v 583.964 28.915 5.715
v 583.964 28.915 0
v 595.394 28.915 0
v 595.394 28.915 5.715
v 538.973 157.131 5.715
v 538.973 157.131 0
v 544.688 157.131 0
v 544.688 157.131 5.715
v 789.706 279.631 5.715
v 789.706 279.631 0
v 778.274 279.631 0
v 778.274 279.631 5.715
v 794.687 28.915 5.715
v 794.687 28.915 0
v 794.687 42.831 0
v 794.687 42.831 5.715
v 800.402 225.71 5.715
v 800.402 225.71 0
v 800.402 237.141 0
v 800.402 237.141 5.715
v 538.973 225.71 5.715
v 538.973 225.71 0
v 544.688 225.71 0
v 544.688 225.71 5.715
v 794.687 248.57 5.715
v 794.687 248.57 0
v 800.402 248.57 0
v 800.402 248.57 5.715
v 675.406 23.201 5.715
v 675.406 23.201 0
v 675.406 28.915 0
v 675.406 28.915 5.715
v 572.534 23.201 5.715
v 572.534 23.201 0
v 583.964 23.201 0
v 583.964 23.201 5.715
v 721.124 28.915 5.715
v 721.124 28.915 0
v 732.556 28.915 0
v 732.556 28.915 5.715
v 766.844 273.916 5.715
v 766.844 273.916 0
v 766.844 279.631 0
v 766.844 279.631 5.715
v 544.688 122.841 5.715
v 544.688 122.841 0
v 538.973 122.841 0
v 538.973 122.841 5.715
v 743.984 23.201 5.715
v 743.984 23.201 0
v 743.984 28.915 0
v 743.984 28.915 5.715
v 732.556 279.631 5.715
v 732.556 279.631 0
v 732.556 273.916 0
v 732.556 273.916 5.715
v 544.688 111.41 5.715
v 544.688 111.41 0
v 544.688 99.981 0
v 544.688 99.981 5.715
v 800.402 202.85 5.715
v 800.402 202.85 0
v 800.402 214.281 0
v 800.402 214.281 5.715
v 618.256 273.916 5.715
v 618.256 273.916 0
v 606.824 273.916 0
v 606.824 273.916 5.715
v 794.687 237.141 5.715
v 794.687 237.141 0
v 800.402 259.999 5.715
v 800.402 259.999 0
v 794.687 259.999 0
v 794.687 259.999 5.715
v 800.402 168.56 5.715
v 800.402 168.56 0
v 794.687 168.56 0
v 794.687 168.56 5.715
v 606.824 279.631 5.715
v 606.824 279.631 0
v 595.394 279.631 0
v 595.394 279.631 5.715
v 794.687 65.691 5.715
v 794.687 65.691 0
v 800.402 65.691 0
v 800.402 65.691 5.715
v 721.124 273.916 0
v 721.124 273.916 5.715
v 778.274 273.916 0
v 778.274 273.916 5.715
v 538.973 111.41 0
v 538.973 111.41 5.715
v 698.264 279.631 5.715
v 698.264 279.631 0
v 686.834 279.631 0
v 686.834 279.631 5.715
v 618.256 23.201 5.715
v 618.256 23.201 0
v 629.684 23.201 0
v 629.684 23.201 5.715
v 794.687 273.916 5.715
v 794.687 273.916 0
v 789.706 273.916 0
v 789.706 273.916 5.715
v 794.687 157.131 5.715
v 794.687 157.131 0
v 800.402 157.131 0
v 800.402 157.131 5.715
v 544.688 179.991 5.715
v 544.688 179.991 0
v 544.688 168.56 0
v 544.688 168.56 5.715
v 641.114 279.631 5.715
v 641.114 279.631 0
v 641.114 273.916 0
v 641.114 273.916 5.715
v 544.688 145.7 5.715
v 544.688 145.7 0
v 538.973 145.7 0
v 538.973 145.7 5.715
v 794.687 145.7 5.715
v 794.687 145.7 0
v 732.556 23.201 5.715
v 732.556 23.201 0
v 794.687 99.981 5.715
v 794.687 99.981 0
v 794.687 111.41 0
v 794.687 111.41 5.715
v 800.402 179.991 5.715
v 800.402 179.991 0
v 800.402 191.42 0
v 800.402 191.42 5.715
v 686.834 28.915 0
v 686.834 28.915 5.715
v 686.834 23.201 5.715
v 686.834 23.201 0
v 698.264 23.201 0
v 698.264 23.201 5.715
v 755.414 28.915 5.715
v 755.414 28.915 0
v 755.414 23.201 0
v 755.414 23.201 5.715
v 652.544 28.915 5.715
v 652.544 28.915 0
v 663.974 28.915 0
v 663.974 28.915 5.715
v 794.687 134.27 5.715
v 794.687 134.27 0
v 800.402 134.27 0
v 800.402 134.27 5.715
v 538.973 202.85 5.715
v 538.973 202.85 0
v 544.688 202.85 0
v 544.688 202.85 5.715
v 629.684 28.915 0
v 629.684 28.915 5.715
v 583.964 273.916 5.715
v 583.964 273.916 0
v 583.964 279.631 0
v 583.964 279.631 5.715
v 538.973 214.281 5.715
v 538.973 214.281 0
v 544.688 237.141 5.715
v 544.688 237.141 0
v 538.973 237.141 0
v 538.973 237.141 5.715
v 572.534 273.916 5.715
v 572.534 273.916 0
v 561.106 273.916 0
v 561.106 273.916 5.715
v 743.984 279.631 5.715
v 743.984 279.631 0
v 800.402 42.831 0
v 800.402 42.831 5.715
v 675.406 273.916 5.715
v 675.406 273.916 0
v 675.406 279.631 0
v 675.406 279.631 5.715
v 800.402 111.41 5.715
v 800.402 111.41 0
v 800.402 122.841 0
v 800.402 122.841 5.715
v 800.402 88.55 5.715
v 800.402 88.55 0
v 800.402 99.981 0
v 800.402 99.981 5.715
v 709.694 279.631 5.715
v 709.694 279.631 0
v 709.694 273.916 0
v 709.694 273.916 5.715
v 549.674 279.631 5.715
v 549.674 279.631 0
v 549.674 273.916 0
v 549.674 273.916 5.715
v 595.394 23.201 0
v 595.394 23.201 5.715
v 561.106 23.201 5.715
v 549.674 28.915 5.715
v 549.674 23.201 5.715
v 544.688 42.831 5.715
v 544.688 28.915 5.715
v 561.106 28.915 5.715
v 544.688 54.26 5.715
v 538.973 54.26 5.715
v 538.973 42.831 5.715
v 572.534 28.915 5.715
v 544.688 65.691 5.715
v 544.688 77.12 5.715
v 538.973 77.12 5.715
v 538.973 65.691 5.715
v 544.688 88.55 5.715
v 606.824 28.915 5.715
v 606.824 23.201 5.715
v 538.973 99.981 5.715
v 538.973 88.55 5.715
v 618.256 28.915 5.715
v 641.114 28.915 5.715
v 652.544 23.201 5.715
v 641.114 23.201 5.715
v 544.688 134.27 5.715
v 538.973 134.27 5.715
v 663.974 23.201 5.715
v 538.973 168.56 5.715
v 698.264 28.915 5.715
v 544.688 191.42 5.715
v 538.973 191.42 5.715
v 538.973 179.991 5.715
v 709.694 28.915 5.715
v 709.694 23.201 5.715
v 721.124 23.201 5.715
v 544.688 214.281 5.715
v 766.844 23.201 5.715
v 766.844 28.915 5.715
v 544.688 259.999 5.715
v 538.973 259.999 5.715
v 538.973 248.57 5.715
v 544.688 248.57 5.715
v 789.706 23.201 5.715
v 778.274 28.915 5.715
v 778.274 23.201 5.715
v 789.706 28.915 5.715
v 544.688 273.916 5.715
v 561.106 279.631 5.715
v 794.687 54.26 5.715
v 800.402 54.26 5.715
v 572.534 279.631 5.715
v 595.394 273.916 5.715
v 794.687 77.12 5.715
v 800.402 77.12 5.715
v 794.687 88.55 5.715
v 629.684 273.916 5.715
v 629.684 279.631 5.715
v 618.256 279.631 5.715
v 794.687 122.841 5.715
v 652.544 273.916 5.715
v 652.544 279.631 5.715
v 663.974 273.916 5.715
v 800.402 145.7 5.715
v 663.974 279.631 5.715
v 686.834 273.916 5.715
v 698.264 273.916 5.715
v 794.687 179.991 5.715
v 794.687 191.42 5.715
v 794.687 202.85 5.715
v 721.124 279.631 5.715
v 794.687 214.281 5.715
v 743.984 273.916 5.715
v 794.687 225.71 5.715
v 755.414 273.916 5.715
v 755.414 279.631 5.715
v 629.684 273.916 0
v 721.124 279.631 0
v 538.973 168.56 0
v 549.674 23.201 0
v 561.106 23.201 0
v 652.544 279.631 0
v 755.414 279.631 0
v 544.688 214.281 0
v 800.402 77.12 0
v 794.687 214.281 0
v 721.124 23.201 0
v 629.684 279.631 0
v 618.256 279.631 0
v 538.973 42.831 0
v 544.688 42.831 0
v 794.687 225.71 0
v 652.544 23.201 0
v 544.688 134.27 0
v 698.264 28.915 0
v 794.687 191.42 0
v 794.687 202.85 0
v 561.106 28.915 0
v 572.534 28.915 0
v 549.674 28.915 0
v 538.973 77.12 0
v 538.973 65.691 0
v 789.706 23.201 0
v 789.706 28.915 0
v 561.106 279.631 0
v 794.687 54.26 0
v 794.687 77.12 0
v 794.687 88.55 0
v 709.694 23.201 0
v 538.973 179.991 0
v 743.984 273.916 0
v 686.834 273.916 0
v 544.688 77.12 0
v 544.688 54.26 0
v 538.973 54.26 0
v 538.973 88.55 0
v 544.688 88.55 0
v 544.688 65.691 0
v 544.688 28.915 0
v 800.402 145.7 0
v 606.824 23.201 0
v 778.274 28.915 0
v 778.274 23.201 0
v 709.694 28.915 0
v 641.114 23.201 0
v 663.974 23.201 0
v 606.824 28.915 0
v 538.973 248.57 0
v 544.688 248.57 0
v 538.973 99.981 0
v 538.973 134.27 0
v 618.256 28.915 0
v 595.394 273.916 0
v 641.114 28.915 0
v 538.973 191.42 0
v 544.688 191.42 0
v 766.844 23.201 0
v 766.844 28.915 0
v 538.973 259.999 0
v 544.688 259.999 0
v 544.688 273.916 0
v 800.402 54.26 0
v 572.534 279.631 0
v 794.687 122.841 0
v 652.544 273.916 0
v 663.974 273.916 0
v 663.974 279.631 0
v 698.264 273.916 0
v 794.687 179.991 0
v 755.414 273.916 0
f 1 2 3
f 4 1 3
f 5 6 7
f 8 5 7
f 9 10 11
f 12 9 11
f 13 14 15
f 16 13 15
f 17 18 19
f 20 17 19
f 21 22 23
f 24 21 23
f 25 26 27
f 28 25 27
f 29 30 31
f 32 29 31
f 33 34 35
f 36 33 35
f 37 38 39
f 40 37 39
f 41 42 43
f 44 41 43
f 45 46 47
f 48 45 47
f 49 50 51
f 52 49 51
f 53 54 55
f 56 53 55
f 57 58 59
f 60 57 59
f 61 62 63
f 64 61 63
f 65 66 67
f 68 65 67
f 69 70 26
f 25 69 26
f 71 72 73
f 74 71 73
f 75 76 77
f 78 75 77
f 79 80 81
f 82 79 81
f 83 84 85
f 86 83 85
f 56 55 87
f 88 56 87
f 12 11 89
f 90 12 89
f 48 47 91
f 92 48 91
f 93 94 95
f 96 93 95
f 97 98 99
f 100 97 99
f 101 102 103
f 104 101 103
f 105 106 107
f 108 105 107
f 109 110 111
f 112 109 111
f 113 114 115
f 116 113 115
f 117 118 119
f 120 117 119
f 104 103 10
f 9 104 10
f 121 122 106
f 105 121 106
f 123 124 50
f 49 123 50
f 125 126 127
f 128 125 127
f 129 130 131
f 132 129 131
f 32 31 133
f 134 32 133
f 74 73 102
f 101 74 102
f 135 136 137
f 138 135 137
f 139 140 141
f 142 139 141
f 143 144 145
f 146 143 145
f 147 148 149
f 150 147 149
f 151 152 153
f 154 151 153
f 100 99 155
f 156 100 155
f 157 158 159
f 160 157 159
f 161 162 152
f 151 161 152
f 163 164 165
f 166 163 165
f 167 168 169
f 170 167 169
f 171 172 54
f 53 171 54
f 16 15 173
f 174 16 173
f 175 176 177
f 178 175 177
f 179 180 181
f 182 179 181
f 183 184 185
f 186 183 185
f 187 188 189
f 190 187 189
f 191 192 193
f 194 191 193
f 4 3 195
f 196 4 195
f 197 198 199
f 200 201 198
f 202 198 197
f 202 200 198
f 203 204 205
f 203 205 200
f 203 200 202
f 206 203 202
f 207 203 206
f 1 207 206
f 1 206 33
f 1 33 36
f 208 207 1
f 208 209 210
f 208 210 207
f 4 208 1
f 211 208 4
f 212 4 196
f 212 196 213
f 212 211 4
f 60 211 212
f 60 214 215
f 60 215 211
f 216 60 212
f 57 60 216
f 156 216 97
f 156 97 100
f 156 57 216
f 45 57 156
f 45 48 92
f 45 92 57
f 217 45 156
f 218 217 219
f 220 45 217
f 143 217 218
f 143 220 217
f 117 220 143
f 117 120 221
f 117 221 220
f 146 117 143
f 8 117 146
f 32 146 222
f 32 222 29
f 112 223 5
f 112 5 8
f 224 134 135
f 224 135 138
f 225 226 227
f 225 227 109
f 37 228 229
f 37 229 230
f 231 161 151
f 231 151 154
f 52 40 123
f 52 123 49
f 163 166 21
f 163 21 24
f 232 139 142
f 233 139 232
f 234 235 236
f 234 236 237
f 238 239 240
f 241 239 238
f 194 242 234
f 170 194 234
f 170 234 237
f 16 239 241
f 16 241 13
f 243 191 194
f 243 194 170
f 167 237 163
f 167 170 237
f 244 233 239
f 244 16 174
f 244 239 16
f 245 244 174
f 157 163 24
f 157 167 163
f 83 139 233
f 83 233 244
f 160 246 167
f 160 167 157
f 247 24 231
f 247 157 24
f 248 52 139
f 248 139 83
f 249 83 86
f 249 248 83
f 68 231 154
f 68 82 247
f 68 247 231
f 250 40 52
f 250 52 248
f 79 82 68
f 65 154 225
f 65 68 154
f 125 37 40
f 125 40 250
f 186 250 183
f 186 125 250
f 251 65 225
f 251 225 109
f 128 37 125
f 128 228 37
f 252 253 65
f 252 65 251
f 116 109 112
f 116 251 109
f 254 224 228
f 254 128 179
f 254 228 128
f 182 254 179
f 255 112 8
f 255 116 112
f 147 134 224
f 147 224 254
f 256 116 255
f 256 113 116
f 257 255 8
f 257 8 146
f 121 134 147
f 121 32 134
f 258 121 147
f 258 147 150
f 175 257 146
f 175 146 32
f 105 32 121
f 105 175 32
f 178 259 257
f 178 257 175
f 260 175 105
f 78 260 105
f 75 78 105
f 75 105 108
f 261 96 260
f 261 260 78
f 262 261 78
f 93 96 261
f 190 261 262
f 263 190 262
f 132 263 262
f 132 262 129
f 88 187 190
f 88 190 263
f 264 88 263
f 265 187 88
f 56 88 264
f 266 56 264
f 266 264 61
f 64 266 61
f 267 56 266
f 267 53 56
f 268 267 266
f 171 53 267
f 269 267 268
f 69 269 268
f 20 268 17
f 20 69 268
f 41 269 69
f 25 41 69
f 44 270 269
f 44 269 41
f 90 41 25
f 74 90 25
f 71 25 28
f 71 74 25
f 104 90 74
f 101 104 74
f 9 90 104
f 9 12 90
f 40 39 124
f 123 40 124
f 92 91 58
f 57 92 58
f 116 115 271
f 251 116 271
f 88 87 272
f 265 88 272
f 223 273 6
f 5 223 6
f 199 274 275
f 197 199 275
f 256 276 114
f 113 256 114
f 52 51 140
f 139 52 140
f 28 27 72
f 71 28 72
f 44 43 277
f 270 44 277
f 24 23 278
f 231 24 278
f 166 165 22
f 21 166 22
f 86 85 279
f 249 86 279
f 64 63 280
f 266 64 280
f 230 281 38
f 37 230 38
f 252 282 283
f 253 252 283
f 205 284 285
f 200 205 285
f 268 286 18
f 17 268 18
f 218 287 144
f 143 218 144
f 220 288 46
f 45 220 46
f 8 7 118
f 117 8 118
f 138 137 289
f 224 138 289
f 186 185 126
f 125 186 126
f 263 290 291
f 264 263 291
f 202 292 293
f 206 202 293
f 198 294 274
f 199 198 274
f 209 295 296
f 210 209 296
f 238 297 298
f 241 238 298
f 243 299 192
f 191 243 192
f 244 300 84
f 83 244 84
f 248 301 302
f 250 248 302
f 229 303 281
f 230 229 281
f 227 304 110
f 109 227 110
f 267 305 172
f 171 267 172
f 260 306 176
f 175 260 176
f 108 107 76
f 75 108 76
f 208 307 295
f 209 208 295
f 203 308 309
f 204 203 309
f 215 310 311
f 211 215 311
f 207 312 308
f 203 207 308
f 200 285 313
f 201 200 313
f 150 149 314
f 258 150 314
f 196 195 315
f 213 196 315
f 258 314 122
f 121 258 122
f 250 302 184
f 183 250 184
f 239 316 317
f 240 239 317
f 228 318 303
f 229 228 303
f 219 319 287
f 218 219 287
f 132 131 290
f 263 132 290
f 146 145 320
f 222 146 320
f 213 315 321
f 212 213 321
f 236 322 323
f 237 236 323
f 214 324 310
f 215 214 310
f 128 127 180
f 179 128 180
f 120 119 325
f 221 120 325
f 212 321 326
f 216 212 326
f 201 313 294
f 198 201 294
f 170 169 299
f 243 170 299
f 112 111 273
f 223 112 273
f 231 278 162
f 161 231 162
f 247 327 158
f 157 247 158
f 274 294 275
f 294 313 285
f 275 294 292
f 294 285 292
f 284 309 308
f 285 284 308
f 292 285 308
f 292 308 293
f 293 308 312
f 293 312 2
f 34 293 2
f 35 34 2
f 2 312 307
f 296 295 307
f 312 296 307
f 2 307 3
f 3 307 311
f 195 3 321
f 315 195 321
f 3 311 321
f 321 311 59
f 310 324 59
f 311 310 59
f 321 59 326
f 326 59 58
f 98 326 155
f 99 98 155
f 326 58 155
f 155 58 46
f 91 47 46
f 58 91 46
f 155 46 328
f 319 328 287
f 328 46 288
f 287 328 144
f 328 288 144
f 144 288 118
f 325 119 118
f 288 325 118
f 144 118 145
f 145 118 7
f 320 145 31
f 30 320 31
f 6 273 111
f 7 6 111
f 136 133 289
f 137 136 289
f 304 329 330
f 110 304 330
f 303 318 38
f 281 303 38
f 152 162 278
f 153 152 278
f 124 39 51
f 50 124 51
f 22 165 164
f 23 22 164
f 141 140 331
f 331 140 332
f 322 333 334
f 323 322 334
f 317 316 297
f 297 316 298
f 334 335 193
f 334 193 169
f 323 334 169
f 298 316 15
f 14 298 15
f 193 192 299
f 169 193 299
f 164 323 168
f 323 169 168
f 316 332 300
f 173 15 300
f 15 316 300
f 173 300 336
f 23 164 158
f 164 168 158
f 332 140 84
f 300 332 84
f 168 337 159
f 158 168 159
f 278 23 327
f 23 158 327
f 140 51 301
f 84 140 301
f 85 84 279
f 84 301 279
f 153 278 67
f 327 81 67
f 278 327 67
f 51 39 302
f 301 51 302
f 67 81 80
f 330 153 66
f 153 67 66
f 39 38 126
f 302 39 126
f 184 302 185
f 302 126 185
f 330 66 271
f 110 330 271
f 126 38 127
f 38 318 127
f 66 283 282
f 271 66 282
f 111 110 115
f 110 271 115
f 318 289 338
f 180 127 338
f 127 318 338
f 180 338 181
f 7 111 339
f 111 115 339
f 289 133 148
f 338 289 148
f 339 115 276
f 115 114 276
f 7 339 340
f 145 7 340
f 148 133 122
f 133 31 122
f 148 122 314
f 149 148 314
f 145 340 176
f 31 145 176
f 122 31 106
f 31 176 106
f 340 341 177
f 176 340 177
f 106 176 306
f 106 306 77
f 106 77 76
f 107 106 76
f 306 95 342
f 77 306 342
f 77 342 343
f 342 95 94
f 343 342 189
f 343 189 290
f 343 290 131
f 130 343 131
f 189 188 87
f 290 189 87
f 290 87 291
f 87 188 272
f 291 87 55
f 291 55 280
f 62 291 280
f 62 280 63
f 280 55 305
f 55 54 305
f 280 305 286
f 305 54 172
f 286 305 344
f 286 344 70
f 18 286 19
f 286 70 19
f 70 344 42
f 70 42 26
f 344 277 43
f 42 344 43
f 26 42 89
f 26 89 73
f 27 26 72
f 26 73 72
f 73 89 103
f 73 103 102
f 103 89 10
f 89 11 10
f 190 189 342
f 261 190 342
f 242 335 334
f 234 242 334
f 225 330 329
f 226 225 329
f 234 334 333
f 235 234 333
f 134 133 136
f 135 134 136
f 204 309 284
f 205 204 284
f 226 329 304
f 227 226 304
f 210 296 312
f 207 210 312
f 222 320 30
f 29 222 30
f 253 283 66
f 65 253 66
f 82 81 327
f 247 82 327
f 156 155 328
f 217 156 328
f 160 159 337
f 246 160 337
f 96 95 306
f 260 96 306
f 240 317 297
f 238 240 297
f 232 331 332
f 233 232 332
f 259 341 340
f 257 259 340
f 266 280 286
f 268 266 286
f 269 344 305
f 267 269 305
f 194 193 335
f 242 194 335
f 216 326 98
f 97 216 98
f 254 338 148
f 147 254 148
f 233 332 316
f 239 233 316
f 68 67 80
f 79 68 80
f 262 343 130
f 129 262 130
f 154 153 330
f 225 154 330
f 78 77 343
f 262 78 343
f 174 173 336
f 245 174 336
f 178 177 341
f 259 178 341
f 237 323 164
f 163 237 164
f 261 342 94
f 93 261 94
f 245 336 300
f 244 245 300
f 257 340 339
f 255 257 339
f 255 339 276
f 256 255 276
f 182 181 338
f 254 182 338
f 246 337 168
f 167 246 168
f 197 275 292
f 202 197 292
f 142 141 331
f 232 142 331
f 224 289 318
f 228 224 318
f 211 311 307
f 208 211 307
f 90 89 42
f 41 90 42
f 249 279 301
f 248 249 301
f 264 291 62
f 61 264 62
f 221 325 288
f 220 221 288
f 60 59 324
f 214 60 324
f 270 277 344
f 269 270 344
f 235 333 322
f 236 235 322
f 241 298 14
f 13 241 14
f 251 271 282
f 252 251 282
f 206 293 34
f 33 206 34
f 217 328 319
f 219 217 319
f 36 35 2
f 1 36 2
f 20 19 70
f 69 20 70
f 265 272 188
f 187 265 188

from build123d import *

# Parameters (mm, degrees)
BOSS_EXTRUDE1_DEPTH = 5.715


with BuildPart() as part:
    # Model → Boss-Extrude1 (new body)
    with BuildSketch(Plane.XY):
        Polygon((544.68776, 28.91536), (549.67378, 28.91536), (549.67378, 23.2006394), (561.10632, 23.2006394), (561.10632, 28.91536), (572.53378, 28.91536), (572.53378, 23.2006394), (583.96378, 23.2006394), (583.96378, 28.91536), (595.39378, 28.91536), (595.39378, 23.2006394), (606.82378, 23.2006394), (606.82378, 28.91536), (618.25632, 28.91536), (618.25632, 23.2006394), (629.68378, 23.2006394), (629.68378, 28.91536), (641.11378, 28.91536), (641.11378, 23.2006394), (652.54378, 23.2006394), (652.54378, 28.91536), (663.97378, 28.91536), (663.97378, 23.2006394), (675.40632, 23.2006394), (675.40632, 28.91536), (686.83378, 28.91536), (686.83378, 23.2006394), (698.26378, 23.2006394), (698.26378, 28.91536), (709.69378, 28.91536), (709.69378, 23.2006394), (721.12378, 23.2006394), (721.12378, 28.91536), (732.55632, 28.91536), (732.55632, 23.2006394), (743.98378, 23.2006394), (743.98378, 28.91536), (755.41378, 28.91536), (755.41378, 23.2006394), (766.84378, 23.2006394), (766.84378, 28.91536), (778.27378, 28.91536), (778.27378, 23.2006394), (789.70632, 23.2006394), (789.70632, 28.91536), (794.68726, 28.91536), (794.68726, 42.83075), (800.40226, 42.83075), (800.40226, 54.260496), (794.68726, 54.260496), (794.68726, 65.691004), (800.40226, 65.691004), (800.40226, 77.120496), (794.68726, 77.120496), (794.68726, 88.549988), (800.40226, 88.549988), (800.40226, 99.98075), (794.68726, 99.98075), (794.68726, 111.410496), (800.40226, 111.410496), (800.40226, 122.841004), (794.68726, 122.841004), (794.68726, 134.270496), (800.40226, 134.270496), (800.40226, 145.699988), (794.68726, 145.699988), (794.68726, 157.13075), (800.40226, 157.13075), (800.40226, 168.560496), (794.68726, 168.560496), (794.68726, 179.991004), (800.40226, 179.991004), (800.40226, 191.420496), (794.68726, 191.420496), (794.68726, 202.849988), (800.40226, 202.849988), (800.40226, 214.28075), (794.68726, 214.28075), (794.68726, 225.710496), (800.40226, 225.710496), (800.40226, 237.141004), (794.68726, 237.141004), (794.68726, 248.570496), (800.40226, 248.570496), (800.40226, 259.99948), (794.68726, 259.99948), (794.68726, 273.91614), (789.70632, 273.91614), (789.70632, 279.63114), (778.27378, 279.63114), (778.27378, 273.91614), (766.84378, 273.91614), (766.84378, 279.63114), (755.41378, 279.63114), (755.41378, 273.91614), (743.98378, 273.91614), (743.98378, 279.63114), (732.55632, 279.63114), (732.55632, 273.91614), (721.12378, 273.91614), (721.12378, 279.63114), (709.69378, 279.63114), (709.69378, 273.91614), (698.26378, 273.91614), (698.26378, 279.63114), (686.83378, 279.63114), (686.83378, 273.91614), (675.40632, 273.91614), (675.40632, 279.63114), (663.97378, 279.63114), (663.97378, 273.91614), (652.54378, 273.91614), (652.54378, 279.63114), (641.11378, 279.63114), (641.11378, 273.91614), (629.68378, 273.91614), (629.68378, 279.63114), (618.25632, 279.63114), (618.25632, 273.91614), (606.82378, 273.91614), (606.82378, 279.63114), (595.39378, 279.63114), (595.39378, 273.91614), (583.96378, 273.91614), (583.96378, 279.63114), (572.53378, 279.63114), (572.53378, 273.91614), (561.10632, 273.91614), (561.10632, 279.63114), (549.67378, 279.63114), (549.67378, 273.91614), (544.68776, 273.91614), (544.68776, 259.99948), (538.97276, 259.99948), (538.97276, 248.570496), (544.68776, 248.570496), (544.68776, 237.141004), (538.97276, 237.141004), (538.97276, 225.710496), (544.68776, 225.710496), (544.68776, 214.28075), (538.97276, 214.28075), (538.97276, 202.849988), (544.68776, 202.849988), (544.68776, 191.420496), (538.97276, 191.420496), (538.97276, 179.991004), (544.68776, 179.991004), (544.68776, 168.560496), (538.97276, 168.560496), (538.97276, 157.13075), (544.68776, 157.13075), (544.68776, 145.699988), (538.97276, 145.699988), (538.97276, 134.270496), (544.68776, 134.270496), (544.68776, 122.841004), (538.97276, 122.841004), (538.97276, 111.410496), (544.68776, 111.410496), (544.68776, 99.98075), (538.97276, 99.98075), (538.97276, 88.549988), (544.68776, 88.549988), (544.68776, 77.120496), (538.97276, 77.120496), (538.97276, 65.691004), (544.68776, 65.691004), (544.68776, 54.260496), (538.97276, 54.260496), (538.97276, 42.83075), (544.68776, 42.83075), align=None)
    extrude(amount=BOSS_EXTRUDE1_DEPTH)


solid = part.part
